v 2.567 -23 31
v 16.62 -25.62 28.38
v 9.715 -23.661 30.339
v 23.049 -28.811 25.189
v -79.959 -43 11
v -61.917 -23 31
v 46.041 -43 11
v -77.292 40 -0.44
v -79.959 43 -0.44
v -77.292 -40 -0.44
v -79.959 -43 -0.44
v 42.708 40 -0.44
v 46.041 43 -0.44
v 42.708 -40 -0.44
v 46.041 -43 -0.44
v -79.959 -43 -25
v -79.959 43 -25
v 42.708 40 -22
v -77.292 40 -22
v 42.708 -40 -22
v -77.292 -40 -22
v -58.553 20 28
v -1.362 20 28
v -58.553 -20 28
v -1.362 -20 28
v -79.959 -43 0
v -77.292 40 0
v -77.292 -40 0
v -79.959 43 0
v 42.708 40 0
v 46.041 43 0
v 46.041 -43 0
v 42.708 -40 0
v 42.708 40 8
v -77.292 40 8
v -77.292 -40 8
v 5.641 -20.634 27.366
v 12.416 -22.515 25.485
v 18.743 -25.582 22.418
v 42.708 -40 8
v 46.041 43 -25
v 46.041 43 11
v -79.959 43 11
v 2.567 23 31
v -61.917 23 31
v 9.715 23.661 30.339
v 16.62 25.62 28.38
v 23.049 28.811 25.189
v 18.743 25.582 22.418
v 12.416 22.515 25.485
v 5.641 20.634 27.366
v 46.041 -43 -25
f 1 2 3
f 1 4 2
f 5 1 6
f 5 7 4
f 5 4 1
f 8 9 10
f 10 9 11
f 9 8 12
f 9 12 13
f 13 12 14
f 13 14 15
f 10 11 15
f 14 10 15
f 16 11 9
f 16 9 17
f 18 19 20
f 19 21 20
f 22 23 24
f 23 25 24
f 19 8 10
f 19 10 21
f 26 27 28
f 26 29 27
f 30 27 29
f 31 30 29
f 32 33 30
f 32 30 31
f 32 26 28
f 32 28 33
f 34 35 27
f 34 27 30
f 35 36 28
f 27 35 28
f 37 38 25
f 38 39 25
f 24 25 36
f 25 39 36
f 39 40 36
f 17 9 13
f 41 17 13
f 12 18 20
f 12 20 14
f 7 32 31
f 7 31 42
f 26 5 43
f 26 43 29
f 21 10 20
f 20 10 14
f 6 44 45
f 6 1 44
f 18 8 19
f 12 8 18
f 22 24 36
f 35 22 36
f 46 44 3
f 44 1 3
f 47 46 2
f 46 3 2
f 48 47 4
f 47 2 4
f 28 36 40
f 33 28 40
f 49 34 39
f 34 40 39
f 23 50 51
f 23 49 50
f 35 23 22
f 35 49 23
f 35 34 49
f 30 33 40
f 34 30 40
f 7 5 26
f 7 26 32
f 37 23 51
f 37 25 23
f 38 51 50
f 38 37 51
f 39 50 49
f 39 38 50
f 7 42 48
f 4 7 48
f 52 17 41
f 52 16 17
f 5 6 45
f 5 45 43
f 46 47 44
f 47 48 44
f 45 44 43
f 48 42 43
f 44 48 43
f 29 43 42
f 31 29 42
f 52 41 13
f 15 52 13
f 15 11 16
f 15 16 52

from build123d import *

# Parameters (mm, degrees)
PAD001_DEPTH    = 40
CHAMFER001_SIZE = 20
FILLET001_R     = 39
PAD_DEPTH       = 43
CHAMFER_SIZE    = 20
FILLET_R        = 39
SKETCH002_W     = 164.651825
SKETCH002_H     = 44.684922
POCKET_DEPTH    = 86
SKETCH003_W     = 173.456756
SKETCH003_H     = 38.741608
POCKET001_DEPTH = 86


with BuildPart() as fillet001:
    # Sketch001 → Pad001 (new body, symmetric)
    with BuildSketch(Plane(origin=(0, 0, -25), x_dir=(1, 0, 0), z_dir=(0, -1, 0))):
        Polygon((42.708114, 3), (42.708114, 33), (9.465272, 53), (-58.552668, 53), (-77.291886, 33), (-77.291886, 3), align=None)
    extrude(amount=PAD001_DEPTH, both=True)

    # Chamfer001
    chamfer001_edges = [fillet001.edges().sort_by_distance(p)[0] for p in [
        (-24.543698, 40, 28),
        (-24.543698, -40, 28),
    ]]
    chamfer(chamfer001_edges, length=CHAMFER001_SIZE)

    # Fillet001
    fillet001_edges = [fillet001.edges().sort_by_distance(p)[0] for p in [
        (9.465272, 0, 28),
    ]]
    fillet(fillet001_edges, radius=FILLET001_R)


with BuildPart() as cut:
    # Sketch → Pad (new body, symmetric)
    with BuildSketch(Plane(origin=(0, 0, -25), x_dir=(1, 0, 0), z_dir=(0, -1, 0))):
        Polygon((46.041069, 0), (46.041069, 36), (13.632488, 56), (-61.916813, 56), (-79.958931, 36), (-79.958931, 0), align=None)
    extrude(amount=PAD_DEPTH, both=True)

    # Chamfer
    chamfer_edges = [cut.edges().sort_by_distance(p)[0] for p in [
        (-24.142162, 43, 31),
        (-24.142162, -43, 31),
    ]]
    chamfer(chamfer_edges, length=CHAMFER_SIZE)

    # Fillet
    fillet_edges = [cut.edges().sort_by_distance(p)[0] for p in [
        (13.632488, 0, 31),
    ]]
    fillet(fillet_edges, radius=FILLET_R)

    # Cut: cut Fillet001
    add(fillet001.part, mode=Mode.SUBTRACT)


with BuildPart() as pocket:
    # Pocket base: copy of Cut
    add(cut.part)

    # Sketch002 → Pocket (cut)
    with BuildSketch(Plane.XZ.offset(43)):
        with Locations((-14.08786, 21.902214)):
            Rectangle(SKETCH002_W, SKETCH002_H)
    extrude(amount=-POCKET_DEPTH, mode=Mode.SUBTRACT)


with BuildPart() as pocket001:
    # Pocket001 base: copy of Cut
    add(cut.part)

    # Sketch003 → Pocket001 (cut)
    with BuildSketch(Plane.XZ.offset(43)):
        with Locations((-7.04393, -19.370804)):
            Rectangle(SKETCH003_W, SKETCH003_H)
    extrude(amount=-POCKET001_DEPTH, mode=Mode.SUBTRACT)


solid = Compound([pocket.part, pocket001.part])
